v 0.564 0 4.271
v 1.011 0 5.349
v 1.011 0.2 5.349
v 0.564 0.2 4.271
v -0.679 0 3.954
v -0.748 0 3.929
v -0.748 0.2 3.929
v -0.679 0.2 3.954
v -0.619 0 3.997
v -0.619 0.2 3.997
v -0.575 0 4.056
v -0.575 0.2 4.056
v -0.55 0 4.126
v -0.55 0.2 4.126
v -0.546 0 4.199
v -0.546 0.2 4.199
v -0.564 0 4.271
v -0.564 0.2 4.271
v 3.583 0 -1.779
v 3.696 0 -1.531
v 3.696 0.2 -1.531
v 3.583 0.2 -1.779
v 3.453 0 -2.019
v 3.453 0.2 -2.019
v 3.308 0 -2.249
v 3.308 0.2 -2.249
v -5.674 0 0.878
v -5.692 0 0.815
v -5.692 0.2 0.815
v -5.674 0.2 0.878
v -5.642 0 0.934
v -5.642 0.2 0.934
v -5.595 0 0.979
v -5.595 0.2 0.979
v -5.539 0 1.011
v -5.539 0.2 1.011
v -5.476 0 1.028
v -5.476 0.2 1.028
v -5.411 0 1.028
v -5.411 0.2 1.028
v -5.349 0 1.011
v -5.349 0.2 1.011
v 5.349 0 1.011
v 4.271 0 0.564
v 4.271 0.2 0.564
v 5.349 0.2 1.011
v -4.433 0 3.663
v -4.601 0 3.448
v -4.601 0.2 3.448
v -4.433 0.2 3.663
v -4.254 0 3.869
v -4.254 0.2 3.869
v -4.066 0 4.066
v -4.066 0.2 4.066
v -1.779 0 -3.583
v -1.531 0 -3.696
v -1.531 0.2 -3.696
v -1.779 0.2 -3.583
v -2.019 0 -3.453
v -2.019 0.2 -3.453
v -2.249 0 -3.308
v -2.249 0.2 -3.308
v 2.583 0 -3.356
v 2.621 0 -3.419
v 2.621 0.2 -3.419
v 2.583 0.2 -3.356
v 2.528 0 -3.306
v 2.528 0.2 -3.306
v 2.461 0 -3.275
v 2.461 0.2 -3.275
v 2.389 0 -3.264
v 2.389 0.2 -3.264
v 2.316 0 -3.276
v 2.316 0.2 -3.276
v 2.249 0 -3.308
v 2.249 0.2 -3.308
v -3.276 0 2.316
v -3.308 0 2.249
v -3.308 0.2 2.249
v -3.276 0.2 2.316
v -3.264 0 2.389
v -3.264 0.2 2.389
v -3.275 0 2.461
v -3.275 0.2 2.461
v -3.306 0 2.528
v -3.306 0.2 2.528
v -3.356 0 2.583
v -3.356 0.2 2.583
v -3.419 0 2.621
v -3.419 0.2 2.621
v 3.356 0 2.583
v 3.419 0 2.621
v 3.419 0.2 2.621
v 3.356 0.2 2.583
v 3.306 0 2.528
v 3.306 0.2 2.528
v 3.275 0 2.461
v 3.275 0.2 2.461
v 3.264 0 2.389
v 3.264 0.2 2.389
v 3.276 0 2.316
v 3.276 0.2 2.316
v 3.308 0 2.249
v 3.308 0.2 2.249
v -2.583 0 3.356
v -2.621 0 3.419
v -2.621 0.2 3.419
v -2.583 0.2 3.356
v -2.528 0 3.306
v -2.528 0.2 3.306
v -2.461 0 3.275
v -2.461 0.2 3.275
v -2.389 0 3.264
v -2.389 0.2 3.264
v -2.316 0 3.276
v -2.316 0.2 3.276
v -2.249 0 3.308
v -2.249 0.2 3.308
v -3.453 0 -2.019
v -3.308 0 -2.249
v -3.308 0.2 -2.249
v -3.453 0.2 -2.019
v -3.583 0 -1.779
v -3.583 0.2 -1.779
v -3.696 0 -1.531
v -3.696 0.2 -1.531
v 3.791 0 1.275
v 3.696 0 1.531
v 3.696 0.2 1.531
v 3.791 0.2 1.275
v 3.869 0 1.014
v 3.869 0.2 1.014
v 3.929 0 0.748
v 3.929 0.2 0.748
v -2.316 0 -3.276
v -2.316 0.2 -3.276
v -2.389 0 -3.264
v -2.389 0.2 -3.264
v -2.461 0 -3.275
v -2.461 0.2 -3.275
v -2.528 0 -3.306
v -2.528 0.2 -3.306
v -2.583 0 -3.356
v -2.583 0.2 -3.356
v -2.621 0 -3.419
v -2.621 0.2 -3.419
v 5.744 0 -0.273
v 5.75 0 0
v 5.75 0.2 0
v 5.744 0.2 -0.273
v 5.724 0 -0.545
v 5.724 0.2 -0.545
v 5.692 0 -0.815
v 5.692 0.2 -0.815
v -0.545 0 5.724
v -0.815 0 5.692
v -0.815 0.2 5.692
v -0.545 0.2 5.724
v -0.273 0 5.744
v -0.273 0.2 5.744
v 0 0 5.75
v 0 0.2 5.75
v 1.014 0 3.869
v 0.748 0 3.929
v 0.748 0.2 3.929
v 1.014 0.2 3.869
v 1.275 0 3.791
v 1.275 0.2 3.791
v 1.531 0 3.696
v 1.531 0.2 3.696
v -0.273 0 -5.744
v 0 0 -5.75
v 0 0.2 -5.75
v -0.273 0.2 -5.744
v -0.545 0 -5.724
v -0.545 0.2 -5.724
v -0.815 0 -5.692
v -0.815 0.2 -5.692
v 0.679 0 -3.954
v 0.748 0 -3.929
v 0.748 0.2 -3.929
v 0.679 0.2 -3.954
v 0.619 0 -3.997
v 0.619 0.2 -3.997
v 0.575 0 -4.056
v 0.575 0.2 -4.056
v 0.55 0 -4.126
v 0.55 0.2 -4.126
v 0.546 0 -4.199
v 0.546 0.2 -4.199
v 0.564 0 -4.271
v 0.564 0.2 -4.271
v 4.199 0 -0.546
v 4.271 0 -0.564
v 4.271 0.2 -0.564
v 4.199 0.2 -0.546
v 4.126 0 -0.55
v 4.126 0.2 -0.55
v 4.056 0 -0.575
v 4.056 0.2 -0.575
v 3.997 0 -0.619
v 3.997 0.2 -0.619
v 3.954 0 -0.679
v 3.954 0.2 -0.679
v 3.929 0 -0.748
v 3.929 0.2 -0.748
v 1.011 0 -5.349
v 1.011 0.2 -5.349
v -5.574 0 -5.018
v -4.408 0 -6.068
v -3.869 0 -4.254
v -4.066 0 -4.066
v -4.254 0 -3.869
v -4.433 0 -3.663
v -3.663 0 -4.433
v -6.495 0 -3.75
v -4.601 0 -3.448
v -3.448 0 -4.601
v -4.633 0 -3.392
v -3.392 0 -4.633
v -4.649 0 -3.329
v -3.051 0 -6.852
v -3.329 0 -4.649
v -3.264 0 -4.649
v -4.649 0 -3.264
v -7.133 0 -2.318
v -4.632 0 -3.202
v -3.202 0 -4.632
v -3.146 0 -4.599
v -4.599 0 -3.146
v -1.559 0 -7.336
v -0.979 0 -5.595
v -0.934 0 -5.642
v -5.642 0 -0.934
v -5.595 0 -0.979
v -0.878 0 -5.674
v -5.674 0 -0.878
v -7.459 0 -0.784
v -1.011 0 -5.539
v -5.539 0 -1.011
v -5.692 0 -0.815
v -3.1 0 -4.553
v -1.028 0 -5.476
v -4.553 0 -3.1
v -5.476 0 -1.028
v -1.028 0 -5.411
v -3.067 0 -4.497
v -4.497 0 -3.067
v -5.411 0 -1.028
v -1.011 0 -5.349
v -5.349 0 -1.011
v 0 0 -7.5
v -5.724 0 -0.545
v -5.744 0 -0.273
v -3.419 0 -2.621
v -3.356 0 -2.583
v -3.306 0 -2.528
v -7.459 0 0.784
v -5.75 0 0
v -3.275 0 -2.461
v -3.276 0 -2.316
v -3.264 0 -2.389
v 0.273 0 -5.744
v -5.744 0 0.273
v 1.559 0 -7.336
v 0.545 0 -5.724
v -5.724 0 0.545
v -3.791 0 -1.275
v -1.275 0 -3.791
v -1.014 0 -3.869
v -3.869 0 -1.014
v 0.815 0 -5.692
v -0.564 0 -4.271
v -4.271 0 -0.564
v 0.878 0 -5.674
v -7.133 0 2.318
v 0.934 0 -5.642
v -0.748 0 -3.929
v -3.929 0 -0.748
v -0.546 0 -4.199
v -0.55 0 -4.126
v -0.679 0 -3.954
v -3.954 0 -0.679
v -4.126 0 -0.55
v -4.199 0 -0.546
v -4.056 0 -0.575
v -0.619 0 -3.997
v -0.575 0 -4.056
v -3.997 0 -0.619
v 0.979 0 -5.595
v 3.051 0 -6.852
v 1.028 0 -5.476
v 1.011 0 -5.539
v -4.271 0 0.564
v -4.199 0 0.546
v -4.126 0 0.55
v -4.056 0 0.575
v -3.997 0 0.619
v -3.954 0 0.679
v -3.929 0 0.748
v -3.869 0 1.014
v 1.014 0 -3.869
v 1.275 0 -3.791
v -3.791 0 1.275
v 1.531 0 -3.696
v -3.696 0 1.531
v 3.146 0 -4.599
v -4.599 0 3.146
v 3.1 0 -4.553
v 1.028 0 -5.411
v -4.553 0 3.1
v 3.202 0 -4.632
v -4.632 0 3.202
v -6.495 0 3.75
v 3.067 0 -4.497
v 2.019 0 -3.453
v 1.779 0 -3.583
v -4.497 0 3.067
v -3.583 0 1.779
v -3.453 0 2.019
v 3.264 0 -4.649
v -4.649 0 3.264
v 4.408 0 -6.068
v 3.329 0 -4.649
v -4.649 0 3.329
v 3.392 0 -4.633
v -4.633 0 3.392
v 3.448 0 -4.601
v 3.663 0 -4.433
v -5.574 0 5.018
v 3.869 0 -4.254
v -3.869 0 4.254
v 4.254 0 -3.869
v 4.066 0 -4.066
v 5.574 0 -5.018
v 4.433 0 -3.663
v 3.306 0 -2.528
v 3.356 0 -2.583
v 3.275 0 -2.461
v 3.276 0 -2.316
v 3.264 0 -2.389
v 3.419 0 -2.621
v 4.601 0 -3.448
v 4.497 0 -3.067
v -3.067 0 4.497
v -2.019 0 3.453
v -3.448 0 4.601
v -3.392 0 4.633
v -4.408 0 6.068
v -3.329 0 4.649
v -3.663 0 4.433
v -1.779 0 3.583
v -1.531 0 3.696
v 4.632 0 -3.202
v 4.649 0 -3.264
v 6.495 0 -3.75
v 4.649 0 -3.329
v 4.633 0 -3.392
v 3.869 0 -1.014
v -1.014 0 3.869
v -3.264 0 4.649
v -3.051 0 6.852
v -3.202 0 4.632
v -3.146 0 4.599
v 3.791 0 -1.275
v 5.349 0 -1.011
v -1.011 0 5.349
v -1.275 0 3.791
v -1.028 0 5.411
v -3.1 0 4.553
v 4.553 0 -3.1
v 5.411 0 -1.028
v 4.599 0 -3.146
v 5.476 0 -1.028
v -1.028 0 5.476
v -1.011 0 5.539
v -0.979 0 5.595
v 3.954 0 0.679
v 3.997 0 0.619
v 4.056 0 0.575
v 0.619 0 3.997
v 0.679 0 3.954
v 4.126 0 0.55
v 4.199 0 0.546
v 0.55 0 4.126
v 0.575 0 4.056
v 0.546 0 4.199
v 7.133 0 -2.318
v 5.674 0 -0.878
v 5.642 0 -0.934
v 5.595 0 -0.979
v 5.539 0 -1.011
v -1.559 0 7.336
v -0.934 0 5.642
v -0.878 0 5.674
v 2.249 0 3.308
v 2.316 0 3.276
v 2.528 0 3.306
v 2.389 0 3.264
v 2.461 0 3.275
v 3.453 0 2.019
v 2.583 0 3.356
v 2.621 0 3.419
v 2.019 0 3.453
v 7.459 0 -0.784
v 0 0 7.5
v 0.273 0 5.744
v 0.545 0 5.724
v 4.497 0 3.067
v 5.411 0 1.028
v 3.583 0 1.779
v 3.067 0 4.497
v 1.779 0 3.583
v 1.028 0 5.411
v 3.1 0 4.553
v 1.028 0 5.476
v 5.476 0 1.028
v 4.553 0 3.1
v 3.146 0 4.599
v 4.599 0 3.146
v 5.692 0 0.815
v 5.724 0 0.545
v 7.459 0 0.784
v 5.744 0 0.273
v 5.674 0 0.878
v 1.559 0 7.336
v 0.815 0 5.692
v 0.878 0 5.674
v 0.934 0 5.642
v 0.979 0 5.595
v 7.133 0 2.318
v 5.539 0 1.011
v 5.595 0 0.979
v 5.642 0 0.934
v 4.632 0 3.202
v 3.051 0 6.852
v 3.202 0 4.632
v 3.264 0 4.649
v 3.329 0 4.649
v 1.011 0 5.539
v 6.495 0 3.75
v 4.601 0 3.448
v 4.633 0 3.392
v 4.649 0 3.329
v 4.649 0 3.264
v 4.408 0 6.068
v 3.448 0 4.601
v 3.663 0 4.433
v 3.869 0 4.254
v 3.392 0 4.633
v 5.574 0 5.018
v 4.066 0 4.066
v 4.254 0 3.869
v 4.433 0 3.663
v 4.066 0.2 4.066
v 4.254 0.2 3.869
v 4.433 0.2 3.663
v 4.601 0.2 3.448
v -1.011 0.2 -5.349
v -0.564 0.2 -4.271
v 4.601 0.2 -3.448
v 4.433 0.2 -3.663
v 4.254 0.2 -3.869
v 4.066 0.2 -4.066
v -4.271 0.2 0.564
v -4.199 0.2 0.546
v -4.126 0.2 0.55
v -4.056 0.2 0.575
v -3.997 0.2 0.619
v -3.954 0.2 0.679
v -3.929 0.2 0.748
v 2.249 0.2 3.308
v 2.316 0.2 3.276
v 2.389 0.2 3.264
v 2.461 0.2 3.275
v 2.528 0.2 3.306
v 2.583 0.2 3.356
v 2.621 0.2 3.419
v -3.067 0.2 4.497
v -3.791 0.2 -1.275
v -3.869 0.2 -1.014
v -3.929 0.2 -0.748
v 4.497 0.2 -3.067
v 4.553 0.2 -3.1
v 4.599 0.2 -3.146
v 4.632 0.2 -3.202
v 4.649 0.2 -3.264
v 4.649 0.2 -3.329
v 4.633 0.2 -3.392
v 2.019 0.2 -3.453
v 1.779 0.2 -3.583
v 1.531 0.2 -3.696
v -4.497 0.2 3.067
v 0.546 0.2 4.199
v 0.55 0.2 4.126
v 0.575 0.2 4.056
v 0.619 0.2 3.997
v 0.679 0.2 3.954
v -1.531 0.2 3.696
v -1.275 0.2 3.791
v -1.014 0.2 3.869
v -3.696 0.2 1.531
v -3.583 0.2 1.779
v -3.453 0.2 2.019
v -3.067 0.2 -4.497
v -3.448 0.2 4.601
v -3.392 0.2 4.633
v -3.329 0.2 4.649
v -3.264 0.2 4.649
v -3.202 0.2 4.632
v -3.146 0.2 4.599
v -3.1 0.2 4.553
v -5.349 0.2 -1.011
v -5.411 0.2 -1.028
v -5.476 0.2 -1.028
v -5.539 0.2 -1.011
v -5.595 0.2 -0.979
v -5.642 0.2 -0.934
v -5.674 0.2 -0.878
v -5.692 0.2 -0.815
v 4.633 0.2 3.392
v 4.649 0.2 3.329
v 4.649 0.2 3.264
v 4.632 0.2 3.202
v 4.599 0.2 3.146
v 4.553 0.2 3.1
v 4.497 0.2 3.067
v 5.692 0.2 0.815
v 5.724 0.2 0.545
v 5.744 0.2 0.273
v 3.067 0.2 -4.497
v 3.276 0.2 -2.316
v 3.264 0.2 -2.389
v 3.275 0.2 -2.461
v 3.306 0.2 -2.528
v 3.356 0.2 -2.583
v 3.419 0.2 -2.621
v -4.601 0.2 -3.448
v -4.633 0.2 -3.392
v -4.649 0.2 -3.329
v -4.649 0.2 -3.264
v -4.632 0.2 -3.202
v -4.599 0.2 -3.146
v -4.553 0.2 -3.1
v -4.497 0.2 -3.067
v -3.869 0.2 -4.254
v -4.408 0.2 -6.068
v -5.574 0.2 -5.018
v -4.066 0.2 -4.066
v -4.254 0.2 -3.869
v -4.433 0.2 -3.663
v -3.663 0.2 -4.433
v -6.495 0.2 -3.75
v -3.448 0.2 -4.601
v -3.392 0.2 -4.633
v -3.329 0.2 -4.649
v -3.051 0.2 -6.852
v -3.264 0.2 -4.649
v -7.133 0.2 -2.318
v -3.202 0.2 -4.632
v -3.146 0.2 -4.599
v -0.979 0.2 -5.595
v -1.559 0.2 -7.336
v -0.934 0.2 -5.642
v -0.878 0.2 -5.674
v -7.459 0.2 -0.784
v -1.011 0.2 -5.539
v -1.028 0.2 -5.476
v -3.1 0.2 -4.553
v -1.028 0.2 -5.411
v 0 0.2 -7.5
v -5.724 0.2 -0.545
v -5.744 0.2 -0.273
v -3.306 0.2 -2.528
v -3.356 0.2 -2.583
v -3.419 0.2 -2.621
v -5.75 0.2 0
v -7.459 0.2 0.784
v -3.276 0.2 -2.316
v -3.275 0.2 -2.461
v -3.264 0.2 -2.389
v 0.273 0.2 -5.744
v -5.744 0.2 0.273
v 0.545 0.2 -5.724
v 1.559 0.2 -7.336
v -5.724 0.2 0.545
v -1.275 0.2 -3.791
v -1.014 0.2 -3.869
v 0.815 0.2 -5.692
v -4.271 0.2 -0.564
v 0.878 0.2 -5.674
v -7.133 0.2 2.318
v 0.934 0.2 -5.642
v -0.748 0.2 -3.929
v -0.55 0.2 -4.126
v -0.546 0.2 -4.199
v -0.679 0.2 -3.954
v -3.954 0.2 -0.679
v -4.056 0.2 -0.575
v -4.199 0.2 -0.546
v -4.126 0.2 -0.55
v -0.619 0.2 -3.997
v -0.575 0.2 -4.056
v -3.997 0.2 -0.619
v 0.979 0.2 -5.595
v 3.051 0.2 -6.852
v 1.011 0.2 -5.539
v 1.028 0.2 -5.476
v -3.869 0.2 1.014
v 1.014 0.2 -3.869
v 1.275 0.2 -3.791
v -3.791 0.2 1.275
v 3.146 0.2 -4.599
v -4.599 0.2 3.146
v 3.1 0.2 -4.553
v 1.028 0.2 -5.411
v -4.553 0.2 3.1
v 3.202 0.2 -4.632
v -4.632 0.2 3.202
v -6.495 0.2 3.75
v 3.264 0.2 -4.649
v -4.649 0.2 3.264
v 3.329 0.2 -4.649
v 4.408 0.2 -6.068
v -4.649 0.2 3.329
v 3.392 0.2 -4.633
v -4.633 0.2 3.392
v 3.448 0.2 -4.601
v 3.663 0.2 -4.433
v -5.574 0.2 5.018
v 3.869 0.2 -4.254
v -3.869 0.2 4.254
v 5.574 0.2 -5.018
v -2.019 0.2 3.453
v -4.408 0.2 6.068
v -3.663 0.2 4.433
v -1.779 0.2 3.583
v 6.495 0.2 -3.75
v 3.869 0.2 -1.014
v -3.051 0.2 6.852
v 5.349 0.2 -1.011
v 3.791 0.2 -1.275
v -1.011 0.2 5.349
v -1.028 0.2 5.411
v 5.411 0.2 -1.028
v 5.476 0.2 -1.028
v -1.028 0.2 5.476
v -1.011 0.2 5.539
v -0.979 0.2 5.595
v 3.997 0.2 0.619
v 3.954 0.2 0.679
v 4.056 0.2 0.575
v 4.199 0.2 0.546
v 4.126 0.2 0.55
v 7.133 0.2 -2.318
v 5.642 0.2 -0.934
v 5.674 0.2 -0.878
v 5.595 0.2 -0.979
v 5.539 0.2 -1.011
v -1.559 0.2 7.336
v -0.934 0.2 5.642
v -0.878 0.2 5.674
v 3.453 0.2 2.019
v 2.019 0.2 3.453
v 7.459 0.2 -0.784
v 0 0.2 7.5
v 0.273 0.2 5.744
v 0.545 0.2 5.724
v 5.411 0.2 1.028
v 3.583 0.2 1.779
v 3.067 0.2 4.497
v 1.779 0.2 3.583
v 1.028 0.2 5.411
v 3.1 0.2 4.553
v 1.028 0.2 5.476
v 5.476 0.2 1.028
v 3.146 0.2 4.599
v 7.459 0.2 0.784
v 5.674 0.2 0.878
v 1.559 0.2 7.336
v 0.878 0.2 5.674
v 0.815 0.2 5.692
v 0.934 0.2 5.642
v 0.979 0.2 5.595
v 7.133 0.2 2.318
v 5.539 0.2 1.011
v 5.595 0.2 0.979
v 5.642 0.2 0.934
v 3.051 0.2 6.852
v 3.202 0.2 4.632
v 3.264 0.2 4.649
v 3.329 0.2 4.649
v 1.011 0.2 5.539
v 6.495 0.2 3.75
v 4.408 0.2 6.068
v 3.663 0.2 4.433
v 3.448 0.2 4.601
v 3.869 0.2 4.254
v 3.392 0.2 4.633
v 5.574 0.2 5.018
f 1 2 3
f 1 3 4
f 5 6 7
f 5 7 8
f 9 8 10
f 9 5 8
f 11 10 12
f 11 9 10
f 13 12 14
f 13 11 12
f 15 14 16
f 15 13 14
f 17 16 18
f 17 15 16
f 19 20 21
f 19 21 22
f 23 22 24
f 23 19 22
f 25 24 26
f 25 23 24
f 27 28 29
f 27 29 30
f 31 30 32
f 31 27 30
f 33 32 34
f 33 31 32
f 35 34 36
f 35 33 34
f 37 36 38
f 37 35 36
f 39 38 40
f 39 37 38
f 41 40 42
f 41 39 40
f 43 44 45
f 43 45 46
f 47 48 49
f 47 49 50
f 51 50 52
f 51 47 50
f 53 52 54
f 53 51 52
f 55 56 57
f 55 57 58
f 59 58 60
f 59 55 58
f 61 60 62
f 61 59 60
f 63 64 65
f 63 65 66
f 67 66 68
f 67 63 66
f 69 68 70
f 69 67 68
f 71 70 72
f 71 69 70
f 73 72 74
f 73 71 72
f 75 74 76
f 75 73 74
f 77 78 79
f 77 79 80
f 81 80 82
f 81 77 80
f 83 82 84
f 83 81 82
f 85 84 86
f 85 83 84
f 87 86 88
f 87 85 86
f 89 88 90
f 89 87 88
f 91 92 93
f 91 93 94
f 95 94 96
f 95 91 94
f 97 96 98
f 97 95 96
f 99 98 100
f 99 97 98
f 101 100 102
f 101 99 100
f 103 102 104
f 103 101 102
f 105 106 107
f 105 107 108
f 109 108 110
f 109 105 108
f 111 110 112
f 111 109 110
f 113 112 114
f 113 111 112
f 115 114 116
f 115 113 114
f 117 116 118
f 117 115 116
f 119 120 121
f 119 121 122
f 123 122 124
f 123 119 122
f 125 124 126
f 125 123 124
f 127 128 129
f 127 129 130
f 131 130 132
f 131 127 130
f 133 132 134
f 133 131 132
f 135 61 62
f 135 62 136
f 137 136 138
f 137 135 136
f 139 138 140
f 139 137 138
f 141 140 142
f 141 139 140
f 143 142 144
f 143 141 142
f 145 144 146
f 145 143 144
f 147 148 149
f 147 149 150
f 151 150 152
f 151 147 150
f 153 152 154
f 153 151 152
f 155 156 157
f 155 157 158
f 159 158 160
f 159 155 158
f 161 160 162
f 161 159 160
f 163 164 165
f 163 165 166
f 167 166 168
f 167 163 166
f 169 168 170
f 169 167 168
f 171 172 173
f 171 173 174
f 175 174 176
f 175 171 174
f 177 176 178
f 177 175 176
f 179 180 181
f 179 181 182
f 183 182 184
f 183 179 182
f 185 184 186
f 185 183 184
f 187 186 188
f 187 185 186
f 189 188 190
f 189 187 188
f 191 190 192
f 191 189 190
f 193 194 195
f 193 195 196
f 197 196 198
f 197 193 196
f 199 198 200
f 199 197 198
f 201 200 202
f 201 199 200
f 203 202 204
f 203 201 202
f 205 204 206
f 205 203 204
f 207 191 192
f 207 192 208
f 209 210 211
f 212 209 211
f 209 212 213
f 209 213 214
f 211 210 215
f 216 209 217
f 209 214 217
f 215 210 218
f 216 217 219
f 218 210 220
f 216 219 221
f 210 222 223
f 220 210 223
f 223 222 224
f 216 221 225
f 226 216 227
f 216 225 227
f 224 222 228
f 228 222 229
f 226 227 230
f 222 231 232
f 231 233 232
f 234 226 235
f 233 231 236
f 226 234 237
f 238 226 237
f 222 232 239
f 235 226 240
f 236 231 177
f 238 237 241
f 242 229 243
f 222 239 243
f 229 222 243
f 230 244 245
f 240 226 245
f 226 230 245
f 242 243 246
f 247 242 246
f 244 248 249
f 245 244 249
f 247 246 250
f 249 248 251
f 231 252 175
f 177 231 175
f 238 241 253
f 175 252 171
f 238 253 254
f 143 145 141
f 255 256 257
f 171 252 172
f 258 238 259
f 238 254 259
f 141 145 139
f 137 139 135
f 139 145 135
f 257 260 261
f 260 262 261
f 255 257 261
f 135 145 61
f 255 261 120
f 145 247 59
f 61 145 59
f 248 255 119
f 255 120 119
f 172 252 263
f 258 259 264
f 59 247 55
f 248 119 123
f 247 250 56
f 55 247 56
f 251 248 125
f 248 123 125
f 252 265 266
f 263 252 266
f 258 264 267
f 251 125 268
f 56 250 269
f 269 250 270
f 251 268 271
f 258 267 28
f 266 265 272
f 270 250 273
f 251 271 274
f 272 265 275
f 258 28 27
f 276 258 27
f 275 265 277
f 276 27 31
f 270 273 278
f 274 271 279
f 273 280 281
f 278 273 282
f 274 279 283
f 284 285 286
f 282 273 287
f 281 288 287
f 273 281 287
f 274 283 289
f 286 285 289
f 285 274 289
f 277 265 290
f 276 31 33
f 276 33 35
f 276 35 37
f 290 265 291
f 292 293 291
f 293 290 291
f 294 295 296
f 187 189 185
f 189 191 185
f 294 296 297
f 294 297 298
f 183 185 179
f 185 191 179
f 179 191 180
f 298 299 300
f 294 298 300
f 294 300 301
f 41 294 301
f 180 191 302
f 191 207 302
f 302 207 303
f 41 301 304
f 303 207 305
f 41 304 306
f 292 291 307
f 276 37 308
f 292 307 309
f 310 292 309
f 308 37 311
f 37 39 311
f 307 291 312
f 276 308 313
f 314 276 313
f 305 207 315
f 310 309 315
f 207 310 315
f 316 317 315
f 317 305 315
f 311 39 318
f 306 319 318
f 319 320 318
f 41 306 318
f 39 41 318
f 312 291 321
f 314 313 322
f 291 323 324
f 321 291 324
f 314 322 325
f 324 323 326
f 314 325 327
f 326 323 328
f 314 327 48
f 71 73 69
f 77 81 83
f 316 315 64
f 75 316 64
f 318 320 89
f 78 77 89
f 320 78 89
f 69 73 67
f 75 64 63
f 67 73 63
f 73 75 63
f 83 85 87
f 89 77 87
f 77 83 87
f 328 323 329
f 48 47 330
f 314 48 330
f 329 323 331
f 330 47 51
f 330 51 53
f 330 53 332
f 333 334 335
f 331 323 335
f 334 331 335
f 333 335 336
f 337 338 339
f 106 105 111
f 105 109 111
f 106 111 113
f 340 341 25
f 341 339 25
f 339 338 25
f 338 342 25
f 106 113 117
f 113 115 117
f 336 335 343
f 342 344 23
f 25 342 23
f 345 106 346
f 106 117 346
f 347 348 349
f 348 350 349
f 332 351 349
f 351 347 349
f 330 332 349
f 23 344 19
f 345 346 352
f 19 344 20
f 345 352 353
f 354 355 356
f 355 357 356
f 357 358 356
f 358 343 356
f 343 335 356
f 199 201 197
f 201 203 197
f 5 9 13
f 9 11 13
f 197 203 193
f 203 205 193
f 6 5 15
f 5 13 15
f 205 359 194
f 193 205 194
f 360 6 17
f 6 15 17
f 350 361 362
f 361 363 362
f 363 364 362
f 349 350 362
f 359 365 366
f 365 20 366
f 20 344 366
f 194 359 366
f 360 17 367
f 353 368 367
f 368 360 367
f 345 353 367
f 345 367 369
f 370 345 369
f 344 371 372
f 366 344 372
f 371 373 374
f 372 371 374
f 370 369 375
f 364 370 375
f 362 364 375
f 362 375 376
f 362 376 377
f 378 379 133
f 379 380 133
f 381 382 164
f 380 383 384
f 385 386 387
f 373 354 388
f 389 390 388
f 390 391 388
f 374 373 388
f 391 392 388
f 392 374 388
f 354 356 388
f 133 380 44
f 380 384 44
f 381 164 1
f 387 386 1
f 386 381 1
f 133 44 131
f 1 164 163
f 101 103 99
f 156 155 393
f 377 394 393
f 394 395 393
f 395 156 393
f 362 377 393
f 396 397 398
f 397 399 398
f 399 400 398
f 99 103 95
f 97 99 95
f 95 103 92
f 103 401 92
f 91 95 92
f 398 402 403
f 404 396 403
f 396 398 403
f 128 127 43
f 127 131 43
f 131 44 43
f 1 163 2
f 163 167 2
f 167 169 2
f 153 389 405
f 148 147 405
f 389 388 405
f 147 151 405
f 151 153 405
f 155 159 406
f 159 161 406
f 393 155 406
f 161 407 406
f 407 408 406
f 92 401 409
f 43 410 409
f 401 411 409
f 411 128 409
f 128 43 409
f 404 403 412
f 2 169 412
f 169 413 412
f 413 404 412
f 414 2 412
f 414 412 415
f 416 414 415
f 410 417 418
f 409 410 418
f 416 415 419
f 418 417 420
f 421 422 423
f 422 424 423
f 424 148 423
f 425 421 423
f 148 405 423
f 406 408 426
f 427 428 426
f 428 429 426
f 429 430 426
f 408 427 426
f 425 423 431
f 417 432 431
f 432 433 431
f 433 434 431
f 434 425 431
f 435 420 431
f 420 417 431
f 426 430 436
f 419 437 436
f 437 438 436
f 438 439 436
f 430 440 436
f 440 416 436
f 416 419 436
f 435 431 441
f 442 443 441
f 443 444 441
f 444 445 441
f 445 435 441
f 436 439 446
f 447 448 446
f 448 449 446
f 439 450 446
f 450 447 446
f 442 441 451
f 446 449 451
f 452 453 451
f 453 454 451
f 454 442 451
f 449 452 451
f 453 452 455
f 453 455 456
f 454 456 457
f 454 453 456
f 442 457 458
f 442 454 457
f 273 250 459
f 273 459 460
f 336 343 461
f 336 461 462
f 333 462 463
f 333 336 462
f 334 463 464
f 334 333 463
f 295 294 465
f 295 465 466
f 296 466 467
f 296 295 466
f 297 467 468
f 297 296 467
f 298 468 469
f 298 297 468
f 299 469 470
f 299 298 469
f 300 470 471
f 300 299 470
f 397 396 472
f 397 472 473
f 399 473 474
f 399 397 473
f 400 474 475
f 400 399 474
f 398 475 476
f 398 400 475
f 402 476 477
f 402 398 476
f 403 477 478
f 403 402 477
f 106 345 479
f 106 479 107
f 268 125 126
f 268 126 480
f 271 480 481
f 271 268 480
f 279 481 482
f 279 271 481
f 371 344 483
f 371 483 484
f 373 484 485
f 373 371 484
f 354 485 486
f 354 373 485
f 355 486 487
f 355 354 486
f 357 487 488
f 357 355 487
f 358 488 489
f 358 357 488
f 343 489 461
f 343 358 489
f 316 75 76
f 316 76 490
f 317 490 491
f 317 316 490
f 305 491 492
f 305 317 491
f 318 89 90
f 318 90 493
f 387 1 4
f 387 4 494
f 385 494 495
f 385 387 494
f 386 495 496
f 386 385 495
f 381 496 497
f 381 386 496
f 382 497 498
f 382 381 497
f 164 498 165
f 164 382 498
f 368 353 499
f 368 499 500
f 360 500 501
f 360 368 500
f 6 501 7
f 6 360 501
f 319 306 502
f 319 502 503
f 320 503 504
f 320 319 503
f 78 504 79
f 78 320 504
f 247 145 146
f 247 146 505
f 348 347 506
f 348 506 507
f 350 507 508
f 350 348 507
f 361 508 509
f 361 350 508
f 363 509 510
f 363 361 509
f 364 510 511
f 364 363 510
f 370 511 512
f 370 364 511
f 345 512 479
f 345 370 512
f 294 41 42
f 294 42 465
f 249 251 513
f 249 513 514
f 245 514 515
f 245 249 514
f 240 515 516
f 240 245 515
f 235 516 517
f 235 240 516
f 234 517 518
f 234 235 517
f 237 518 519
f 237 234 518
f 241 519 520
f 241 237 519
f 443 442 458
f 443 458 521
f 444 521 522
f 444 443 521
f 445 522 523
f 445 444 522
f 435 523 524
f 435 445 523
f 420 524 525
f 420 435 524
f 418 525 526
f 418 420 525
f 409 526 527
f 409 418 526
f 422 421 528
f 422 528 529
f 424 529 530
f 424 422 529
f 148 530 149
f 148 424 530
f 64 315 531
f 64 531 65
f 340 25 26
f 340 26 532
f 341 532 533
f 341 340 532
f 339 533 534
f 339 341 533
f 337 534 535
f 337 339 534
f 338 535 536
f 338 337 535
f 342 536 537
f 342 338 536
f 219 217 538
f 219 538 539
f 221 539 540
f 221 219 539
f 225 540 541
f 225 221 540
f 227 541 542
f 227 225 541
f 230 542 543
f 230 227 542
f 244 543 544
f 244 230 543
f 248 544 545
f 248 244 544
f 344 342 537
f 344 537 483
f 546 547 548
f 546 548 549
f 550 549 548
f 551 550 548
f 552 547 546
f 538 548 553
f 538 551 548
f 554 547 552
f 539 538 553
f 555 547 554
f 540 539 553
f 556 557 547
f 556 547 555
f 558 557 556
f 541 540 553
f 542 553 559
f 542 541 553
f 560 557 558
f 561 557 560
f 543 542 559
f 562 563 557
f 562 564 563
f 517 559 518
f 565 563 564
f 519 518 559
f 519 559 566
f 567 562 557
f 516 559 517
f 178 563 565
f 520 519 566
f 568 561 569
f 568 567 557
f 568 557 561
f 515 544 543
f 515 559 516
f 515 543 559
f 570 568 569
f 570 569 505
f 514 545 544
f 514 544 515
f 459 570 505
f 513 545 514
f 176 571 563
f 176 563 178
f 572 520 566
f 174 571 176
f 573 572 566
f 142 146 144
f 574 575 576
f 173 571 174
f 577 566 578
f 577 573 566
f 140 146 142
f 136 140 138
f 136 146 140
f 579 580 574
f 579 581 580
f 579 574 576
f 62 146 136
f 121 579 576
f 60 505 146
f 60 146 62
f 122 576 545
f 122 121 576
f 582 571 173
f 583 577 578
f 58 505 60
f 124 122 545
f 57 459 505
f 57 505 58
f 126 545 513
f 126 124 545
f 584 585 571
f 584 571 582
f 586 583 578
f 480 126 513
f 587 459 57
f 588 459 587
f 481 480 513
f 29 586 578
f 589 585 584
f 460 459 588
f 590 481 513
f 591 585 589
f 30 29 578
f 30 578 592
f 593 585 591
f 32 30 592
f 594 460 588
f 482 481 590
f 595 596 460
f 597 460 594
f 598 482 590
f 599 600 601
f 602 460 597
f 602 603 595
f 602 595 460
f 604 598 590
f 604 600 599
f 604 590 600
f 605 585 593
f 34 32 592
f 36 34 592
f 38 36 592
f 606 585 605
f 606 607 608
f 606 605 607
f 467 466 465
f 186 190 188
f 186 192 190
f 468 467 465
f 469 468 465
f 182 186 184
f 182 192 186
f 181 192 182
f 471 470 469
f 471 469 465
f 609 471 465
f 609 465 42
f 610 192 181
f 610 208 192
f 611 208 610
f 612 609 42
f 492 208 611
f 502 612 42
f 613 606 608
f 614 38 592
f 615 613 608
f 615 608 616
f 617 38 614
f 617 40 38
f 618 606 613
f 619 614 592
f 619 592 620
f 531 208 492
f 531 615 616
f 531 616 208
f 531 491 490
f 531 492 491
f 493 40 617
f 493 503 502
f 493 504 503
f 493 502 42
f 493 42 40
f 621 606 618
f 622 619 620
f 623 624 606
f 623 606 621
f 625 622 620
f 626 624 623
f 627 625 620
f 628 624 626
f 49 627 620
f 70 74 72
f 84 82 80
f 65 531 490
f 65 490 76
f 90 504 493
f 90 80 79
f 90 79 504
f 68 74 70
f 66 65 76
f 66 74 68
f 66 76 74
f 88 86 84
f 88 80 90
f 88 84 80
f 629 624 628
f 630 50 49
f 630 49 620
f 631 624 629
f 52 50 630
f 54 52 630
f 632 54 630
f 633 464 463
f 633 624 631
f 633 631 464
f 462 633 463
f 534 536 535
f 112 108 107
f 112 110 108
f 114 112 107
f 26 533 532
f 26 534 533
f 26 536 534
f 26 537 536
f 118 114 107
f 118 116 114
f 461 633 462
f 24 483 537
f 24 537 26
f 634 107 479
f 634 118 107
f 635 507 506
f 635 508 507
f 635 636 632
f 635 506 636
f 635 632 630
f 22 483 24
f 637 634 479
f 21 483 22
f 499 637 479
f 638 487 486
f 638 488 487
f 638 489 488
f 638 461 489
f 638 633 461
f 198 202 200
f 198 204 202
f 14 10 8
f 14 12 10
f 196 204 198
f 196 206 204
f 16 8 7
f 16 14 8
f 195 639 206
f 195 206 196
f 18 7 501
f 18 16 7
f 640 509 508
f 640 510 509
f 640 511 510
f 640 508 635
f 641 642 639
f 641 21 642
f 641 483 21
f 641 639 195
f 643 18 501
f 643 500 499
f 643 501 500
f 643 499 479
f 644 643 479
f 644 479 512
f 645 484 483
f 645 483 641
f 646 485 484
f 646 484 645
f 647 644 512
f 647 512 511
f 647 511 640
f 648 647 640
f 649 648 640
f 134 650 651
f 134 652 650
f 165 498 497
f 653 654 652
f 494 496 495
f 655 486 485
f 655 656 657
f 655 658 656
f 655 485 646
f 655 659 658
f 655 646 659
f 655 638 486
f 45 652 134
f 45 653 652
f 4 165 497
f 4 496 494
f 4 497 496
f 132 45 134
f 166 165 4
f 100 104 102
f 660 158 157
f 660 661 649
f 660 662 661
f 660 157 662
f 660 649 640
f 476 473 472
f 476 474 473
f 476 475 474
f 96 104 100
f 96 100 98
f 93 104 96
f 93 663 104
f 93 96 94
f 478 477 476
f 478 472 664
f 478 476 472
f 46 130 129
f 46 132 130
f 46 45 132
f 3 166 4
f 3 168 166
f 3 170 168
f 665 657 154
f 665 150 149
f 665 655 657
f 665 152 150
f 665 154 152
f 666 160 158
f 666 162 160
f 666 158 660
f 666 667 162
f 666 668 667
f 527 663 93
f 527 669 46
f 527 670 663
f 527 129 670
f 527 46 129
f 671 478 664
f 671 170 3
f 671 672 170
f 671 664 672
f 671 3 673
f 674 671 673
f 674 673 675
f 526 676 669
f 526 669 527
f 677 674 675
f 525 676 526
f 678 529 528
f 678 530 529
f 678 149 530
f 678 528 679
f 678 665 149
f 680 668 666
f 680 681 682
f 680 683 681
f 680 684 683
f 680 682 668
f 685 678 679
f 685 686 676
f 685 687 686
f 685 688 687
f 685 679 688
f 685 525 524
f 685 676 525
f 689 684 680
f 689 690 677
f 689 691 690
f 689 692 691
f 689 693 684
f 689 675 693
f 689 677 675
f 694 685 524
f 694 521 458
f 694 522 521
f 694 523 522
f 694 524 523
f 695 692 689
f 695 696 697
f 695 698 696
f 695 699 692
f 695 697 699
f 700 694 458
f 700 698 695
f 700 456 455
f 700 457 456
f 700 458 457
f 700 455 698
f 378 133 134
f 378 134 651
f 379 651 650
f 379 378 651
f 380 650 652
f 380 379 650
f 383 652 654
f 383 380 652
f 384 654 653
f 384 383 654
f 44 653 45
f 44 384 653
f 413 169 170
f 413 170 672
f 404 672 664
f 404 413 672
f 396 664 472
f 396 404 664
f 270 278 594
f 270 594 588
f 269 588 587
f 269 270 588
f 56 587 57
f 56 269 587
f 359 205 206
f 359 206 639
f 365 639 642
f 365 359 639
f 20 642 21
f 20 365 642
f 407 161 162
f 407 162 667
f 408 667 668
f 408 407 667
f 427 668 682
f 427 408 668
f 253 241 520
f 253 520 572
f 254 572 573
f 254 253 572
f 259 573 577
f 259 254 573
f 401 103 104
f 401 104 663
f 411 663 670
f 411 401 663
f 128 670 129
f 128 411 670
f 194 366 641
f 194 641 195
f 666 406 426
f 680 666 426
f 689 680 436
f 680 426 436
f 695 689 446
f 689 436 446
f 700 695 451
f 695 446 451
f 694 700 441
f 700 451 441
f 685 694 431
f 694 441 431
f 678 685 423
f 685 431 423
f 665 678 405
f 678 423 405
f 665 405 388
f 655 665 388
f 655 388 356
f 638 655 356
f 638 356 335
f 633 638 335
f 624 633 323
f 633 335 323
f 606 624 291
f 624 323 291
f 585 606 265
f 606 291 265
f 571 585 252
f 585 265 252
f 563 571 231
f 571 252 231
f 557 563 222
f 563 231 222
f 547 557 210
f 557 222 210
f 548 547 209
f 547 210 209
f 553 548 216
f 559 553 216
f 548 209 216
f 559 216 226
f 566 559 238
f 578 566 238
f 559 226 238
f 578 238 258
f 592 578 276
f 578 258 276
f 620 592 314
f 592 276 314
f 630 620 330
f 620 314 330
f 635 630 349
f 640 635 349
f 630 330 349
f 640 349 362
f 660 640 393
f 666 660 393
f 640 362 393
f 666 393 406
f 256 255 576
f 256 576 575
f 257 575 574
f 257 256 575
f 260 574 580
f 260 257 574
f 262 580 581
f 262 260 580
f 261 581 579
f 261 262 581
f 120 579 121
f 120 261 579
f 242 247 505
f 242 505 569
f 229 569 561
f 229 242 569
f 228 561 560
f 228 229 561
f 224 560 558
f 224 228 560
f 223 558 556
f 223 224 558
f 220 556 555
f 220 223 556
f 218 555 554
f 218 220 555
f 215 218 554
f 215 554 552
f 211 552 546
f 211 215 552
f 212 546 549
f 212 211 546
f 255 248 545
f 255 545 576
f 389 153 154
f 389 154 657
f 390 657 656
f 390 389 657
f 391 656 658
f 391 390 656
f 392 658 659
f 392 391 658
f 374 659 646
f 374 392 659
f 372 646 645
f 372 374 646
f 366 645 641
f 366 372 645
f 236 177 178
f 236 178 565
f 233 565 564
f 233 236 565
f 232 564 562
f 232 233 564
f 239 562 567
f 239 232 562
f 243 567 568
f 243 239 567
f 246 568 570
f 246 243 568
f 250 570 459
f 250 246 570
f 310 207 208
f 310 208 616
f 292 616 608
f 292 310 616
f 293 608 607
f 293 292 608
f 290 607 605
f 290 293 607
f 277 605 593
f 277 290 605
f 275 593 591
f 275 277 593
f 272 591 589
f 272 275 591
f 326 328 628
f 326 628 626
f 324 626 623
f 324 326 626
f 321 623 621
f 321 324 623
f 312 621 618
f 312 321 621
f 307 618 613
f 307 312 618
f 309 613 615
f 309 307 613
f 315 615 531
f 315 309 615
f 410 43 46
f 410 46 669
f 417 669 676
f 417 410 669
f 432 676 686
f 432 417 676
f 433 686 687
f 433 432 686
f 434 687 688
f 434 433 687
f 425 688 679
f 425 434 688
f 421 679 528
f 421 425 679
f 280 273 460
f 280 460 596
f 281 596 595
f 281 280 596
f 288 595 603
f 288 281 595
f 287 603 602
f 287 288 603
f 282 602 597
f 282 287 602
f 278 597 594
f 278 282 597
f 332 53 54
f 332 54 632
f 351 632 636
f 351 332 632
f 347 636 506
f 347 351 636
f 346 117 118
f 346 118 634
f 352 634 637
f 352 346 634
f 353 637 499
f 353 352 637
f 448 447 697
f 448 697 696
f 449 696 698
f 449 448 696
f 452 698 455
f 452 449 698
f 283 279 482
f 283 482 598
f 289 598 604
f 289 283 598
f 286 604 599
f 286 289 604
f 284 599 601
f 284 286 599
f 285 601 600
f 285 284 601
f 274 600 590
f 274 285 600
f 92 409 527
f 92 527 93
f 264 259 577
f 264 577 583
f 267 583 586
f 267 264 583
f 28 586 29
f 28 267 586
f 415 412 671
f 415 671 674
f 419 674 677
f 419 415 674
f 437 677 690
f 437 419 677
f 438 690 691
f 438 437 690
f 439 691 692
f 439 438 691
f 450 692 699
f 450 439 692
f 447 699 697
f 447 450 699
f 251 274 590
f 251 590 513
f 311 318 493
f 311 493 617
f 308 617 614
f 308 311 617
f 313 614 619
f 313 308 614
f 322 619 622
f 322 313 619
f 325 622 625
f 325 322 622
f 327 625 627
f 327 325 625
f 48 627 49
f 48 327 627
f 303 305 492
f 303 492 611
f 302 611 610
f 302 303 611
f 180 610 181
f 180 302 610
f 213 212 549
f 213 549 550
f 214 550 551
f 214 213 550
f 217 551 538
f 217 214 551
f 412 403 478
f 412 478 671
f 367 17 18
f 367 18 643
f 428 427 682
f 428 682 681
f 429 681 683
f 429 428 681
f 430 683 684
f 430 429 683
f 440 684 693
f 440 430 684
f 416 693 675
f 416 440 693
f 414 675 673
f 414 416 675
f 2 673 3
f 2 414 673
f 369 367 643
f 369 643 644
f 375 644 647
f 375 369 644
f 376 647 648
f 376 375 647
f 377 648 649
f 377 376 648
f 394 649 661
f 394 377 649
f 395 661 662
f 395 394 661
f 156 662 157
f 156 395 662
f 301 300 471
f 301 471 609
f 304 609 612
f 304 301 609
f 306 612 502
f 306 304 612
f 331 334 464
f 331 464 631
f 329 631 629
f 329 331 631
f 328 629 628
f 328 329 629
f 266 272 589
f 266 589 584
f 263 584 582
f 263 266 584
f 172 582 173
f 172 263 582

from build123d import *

# Parameters (mm, degrees)
SKETCH1_R           = 7.5
BOSS_EXTRUDE1_DEPTH = 0.2


with BuildPart() as part:
    # Sketch1 → Boss-Extrude1 (new body)
    with BuildSketch(Plane(origin=(0, 0, 0), x_dir=(1, 0, 0), z_dir=(0, 1, 0))):
        with Locations(Location((0, 0, 0), (0, 0, 270))):
            Circle(SKETCH1_R)
        with BuildLine():
            Line((4.270625279, -0.564175126), (5.348769596, -1.010757124))
            ThreePointArc((5.348769596, -1.010757124), (5.568208781, -0.997000043), (5.69191502, -0.815232116))
            ThreePointArc((5.69191502, -0.815232116), (5.735460372, -0.408649381), (5.75, 0))
            ThreePointArc((5.75, 0), (5.735460372, 0.408649381), (5.69191502, 0.815232116))
            ThreePointArc((5.69191502, 0.815232116), (5.568208781, 0.997000043), (5.348769596, 1.010757124))
            Line((5.348769596, 1.010757124), (4.270625279, 0.564175126))
            ThreePointArc((4.270625279, 0.564175126), (4.05620803, 0.575146612), (3.929368867, 0.748371773))
            ThreePointArc((3.929368867, 0.748371773), (3.832459783, 1.145535689), (3.69551813, 1.530733729))
            ThreePointArc((3.69551813, 1.530733729), (3.519974355, 1.899942247), (3.307662127, 2.249304616))
            ThreePointArc((3.307662127, 2.249304616), (3.274862273, 2.461482135), (3.418720152, 2.620856037))
            Line((3.418720152, 2.620856037), (4.496864469, 3.067438036))
            ThreePointArc((4.496864469, 3.067438036), (4.642303679, 3.232332697), (4.601247866, 3.448335552))
            ThreePointArc((4.601247866, 3.448335552), (4.344541671, 3.766624174), (4.065863992, 4.065863992))
            ThreePointArc((4.065863992, 4.065863992), (3.766624174, 4.344541671), (3.448335552, 4.601247866))
            ThreePointArc((3.448335552, 4.601247866), (3.232332697, 4.642303679), (3.067438036, 4.496864469))
            Line((3.067438036, 4.496864469), (2.620856037, 3.418720152))
            ThreePointArc((2.620856037, 3.418720152), (2.461482135, 3.274862273), (2.249304616, 3.307662127))
            ThreePointArc((2.249304616, 3.307662127), (1.899942247, 3.519974355), (1.530733729, 3.69551813))
            ThreePointArc((1.530733729, 3.69551813), (1.145535689, 3.832459783), (0.748371773, 3.929368867))
            ThreePointArc((0.748371773, 3.929368867), (0.575146612, 4.05620803), (0.564175126, 4.270625279))
            Line((0.564175126, 4.270625279), (1.010757124, 5.348769596))
            ThreePointArc((1.010757124, 5.348769596), (0.997000043, 5.568208781), (0.815232116, 5.69191502))
            ThreePointArc((0.815232116, 5.69191502), (0.408649381, 5.735460372), (0, 5.75))
            ThreePointArc((0, 5.75), (-0.408649381, 5.735460372), (-0.815232116, 5.69191502))
            ThreePointArc((-0.815232116, 5.69191502), (-0.997000043, 5.568208781), (-1.010757124, 5.348769596))
            Line((-1.010757124, 5.348769596), (-0.564175126, 4.270625279))
            ThreePointArc((-0.564175126, 4.270625279), (-0.575146612, 4.05620803), (-0.748371773, 3.929368867))
            ThreePointArc((-0.748371773, 3.929368867), (-1.145535689, 3.832459783), (-1.530733729, 3.69551813))
            ThreePointArc((-1.530733729, 3.69551813), (-1.899942247, 3.519974355), (-2.249304616, 3.307662127))
            ThreePointArc((-2.249304616, 3.307662127), (-2.461482135, 3.274862273), (-2.620856037, 3.418720152))
            Line((-2.620856037, 3.418720152), (-3.067438036, 4.496864469))
            ThreePointArc((-3.067438036, 4.496864469), (-3.232332697, 4.642303679), (-3.448335552, 4.601247866))
            ThreePointArc((-3.448335552, 4.601247866), (-3.766624174, 4.344541671), (-4.065863992, 4.065863992))
            ThreePointArc((-4.065863992, 4.065863992), (-4.344541671, 3.766624174), (-4.601247866, 3.448335552))
            ThreePointArc((-4.601247866, 3.448335552), (-4.642303679, 3.232332697), (-4.496864469, 3.067438036))
            Line((-4.496864469, 3.067438036), (-3.418720152, 2.620856037))
            ThreePointArc((-3.418720152, 2.620856037), (-3.274862273, 2.461482135), (-3.307662127, 2.249304616))
            ThreePointArc((-3.307662127, 2.249304616), (-3.519974355, 1.899942247), (-3.69551813, 1.530733729))
            ThreePointArc((-3.69551813, 1.530733729), (-3.832459783, 1.145535689), (-3.929368867, 0.748371773))
            ThreePointArc((-3.929368867, 0.748371773), (-4.05620803, 0.575146612), (-4.270625279, 0.564175126))
            Line((-4.270625279, 0.564175126), (-5.348769596, 1.010757124))
            ThreePointArc((-5.348769596, 1.010757124), (-5.568208781, 0.997000043), (-5.69191502, 0.815232116))
            ThreePointArc((-5.69191502, 0.815232116), (-5.735460372, 0.408649381), (-5.75, 0))
            ThreePointArc((-5.75, 0), (-5.735460372, -0.408649381), (-5.69191502, -0.815232116))
            ThreePointArc((-5.69191502, -0.815232116), (-5.568208781, -0.997000043), (-5.348769596, -1.010757124))
            Line((-5.348769596, -1.010757124), (-4.270625279, -0.564175126))
            ThreePointArc((-4.270625279, -0.564175126), (-4.05620803, -0.575146612), (-3.929368867, -0.748371773))
            ThreePointArc((-3.929368867, -0.748371773), (-3.832459783, -1.145535689), (-3.69551813, -1.530733729))
            ThreePointArc((-3.69551813, -1.530733729), (-3.519974355, -1.899942247), (-3.307662127, -2.249304616))
            ThreePointArc((-3.307662127, -2.249304616), (-3.274862273, -2.461482135), (-3.418720152, -2.620856037))
            Line((-3.418720152, -2.620856037), (-4.496864469, -3.067438036))
            ThreePointArc((-4.496864469, -3.067438036), (-4.642303679, -3.232332697), (-4.601247866, -3.448335552))
            ThreePointArc((-4.601247866, -3.448335552), (-4.344541671, -3.766624174), (-4.065863992, -4.065863992))
            ThreePointArc((-4.065863992, -4.065863992), (-3.766624174, -4.344541671), (-3.448335552, -4.601247866))
            ThreePointArc((-3.448335552, -4.601247866), (-3.232332697, -4.642303679), (-3.067438036, -4.496864469))
            Line((-3.067438036, -4.496864469), (-2.620856037, -3.418720152))
            ThreePointArc((-2.620856037, -3.418720152), (-2.461482135, -3.274862273), (-2.249304616, -3.307662127))
            ThreePointArc((-2.249304616, -3.307662127), (-1.899942247, -3.519974355), (-1.530733729, -3.69551813))
            ThreePointArc((-1.530733729, -3.69551813), (-1.145535689, -3.832459783), (-0.748371773, -3.929368867))
            ThreePointArc((-0.748371773, -3.929368867), (-0.575146612, -4.05620803), (-0.564175126, -4.270625279))
            Line((-0.564175126, -4.270625279), (-1.010757124, -5.348769596))
            ThreePointArc((-1.010757124, -5.348769596), (-0.997000043, -5.568208781), (-0.815232116, -5.69191502))
            ThreePointArc((-0.815232116, -5.69191502), (-0.408649381, -5.735460372), (0, -5.75))
            ThreePointArc((0, -5.75), (0.408649381, -5.735460372), (0.815232116, -5.69191502))
            ThreePointArc((0.815232116, -5.69191502), (0.997000043, -5.568208781), (1.010757124, -5.348769596))
            Line((1.010757124, -5.348769596), (0.564175126, -4.270625279))
            ThreePointArc((0.564175126, -4.270625279), (0.575146612, -4.05620803), (0.748371773, -3.929368867))
            ThreePointArc((0.748371773, -3.929368867), (1.145535689, -3.832459783), (1.530733729, -3.69551813))
            ThreePointArc((1.530733729, -3.69551813), (1.899942247, -3.519974355), (2.249304616, -3.307662127))
            ThreePointArc((2.249304616, -3.307662127), (2.461482135, -3.274862273), (2.620856037, -3.418720152))
            Line((2.620856037, -3.418720152), (3.067438036, -4.496864469))
            ThreePointArc((3.067438036, -4.496864469), (3.232332697, -4.642303679), (3.448335552, -4.601247866))
            ThreePointArc((3.448335552, -4.601247866), (3.766624174, -4.344541671), (4.065863992, -4.065863992))
            ThreePointArc((4.065863992, -4.065863992), (4.344541671, -3.766624174), (4.601247866, -3.448335552))
            ThreePointArc((4.601247866, -3.448335552), (4.642303679, -3.232332697), (4.496864469, -3.067438036))
            Line((4.496864469, -3.067438036), (3.418720152, -2.620856037))
            ThreePointArc((3.418720152, -2.620856037), (3.274862273, -2.461482135), (3.307662127, -2.249304616))
            ThreePointArc((3.307662127, -2.249304616), (3.519974355, -1.899942247), (3.69551813, -1.530733729))
            ThreePointArc((3.69551813, -1.530733729), (3.832459783, -1.145535689), (3.929368867, -0.748371773))
            ThreePointArc((3.929368867, -0.748371773), (4.05620803, -0.575146612), (4.270625279, -0.564175126))
        make_face(mode=Mode.SUBTRACT)
    extrude(amount=BOSS_EXTRUDE1_DEPTH)


solid = part.part
